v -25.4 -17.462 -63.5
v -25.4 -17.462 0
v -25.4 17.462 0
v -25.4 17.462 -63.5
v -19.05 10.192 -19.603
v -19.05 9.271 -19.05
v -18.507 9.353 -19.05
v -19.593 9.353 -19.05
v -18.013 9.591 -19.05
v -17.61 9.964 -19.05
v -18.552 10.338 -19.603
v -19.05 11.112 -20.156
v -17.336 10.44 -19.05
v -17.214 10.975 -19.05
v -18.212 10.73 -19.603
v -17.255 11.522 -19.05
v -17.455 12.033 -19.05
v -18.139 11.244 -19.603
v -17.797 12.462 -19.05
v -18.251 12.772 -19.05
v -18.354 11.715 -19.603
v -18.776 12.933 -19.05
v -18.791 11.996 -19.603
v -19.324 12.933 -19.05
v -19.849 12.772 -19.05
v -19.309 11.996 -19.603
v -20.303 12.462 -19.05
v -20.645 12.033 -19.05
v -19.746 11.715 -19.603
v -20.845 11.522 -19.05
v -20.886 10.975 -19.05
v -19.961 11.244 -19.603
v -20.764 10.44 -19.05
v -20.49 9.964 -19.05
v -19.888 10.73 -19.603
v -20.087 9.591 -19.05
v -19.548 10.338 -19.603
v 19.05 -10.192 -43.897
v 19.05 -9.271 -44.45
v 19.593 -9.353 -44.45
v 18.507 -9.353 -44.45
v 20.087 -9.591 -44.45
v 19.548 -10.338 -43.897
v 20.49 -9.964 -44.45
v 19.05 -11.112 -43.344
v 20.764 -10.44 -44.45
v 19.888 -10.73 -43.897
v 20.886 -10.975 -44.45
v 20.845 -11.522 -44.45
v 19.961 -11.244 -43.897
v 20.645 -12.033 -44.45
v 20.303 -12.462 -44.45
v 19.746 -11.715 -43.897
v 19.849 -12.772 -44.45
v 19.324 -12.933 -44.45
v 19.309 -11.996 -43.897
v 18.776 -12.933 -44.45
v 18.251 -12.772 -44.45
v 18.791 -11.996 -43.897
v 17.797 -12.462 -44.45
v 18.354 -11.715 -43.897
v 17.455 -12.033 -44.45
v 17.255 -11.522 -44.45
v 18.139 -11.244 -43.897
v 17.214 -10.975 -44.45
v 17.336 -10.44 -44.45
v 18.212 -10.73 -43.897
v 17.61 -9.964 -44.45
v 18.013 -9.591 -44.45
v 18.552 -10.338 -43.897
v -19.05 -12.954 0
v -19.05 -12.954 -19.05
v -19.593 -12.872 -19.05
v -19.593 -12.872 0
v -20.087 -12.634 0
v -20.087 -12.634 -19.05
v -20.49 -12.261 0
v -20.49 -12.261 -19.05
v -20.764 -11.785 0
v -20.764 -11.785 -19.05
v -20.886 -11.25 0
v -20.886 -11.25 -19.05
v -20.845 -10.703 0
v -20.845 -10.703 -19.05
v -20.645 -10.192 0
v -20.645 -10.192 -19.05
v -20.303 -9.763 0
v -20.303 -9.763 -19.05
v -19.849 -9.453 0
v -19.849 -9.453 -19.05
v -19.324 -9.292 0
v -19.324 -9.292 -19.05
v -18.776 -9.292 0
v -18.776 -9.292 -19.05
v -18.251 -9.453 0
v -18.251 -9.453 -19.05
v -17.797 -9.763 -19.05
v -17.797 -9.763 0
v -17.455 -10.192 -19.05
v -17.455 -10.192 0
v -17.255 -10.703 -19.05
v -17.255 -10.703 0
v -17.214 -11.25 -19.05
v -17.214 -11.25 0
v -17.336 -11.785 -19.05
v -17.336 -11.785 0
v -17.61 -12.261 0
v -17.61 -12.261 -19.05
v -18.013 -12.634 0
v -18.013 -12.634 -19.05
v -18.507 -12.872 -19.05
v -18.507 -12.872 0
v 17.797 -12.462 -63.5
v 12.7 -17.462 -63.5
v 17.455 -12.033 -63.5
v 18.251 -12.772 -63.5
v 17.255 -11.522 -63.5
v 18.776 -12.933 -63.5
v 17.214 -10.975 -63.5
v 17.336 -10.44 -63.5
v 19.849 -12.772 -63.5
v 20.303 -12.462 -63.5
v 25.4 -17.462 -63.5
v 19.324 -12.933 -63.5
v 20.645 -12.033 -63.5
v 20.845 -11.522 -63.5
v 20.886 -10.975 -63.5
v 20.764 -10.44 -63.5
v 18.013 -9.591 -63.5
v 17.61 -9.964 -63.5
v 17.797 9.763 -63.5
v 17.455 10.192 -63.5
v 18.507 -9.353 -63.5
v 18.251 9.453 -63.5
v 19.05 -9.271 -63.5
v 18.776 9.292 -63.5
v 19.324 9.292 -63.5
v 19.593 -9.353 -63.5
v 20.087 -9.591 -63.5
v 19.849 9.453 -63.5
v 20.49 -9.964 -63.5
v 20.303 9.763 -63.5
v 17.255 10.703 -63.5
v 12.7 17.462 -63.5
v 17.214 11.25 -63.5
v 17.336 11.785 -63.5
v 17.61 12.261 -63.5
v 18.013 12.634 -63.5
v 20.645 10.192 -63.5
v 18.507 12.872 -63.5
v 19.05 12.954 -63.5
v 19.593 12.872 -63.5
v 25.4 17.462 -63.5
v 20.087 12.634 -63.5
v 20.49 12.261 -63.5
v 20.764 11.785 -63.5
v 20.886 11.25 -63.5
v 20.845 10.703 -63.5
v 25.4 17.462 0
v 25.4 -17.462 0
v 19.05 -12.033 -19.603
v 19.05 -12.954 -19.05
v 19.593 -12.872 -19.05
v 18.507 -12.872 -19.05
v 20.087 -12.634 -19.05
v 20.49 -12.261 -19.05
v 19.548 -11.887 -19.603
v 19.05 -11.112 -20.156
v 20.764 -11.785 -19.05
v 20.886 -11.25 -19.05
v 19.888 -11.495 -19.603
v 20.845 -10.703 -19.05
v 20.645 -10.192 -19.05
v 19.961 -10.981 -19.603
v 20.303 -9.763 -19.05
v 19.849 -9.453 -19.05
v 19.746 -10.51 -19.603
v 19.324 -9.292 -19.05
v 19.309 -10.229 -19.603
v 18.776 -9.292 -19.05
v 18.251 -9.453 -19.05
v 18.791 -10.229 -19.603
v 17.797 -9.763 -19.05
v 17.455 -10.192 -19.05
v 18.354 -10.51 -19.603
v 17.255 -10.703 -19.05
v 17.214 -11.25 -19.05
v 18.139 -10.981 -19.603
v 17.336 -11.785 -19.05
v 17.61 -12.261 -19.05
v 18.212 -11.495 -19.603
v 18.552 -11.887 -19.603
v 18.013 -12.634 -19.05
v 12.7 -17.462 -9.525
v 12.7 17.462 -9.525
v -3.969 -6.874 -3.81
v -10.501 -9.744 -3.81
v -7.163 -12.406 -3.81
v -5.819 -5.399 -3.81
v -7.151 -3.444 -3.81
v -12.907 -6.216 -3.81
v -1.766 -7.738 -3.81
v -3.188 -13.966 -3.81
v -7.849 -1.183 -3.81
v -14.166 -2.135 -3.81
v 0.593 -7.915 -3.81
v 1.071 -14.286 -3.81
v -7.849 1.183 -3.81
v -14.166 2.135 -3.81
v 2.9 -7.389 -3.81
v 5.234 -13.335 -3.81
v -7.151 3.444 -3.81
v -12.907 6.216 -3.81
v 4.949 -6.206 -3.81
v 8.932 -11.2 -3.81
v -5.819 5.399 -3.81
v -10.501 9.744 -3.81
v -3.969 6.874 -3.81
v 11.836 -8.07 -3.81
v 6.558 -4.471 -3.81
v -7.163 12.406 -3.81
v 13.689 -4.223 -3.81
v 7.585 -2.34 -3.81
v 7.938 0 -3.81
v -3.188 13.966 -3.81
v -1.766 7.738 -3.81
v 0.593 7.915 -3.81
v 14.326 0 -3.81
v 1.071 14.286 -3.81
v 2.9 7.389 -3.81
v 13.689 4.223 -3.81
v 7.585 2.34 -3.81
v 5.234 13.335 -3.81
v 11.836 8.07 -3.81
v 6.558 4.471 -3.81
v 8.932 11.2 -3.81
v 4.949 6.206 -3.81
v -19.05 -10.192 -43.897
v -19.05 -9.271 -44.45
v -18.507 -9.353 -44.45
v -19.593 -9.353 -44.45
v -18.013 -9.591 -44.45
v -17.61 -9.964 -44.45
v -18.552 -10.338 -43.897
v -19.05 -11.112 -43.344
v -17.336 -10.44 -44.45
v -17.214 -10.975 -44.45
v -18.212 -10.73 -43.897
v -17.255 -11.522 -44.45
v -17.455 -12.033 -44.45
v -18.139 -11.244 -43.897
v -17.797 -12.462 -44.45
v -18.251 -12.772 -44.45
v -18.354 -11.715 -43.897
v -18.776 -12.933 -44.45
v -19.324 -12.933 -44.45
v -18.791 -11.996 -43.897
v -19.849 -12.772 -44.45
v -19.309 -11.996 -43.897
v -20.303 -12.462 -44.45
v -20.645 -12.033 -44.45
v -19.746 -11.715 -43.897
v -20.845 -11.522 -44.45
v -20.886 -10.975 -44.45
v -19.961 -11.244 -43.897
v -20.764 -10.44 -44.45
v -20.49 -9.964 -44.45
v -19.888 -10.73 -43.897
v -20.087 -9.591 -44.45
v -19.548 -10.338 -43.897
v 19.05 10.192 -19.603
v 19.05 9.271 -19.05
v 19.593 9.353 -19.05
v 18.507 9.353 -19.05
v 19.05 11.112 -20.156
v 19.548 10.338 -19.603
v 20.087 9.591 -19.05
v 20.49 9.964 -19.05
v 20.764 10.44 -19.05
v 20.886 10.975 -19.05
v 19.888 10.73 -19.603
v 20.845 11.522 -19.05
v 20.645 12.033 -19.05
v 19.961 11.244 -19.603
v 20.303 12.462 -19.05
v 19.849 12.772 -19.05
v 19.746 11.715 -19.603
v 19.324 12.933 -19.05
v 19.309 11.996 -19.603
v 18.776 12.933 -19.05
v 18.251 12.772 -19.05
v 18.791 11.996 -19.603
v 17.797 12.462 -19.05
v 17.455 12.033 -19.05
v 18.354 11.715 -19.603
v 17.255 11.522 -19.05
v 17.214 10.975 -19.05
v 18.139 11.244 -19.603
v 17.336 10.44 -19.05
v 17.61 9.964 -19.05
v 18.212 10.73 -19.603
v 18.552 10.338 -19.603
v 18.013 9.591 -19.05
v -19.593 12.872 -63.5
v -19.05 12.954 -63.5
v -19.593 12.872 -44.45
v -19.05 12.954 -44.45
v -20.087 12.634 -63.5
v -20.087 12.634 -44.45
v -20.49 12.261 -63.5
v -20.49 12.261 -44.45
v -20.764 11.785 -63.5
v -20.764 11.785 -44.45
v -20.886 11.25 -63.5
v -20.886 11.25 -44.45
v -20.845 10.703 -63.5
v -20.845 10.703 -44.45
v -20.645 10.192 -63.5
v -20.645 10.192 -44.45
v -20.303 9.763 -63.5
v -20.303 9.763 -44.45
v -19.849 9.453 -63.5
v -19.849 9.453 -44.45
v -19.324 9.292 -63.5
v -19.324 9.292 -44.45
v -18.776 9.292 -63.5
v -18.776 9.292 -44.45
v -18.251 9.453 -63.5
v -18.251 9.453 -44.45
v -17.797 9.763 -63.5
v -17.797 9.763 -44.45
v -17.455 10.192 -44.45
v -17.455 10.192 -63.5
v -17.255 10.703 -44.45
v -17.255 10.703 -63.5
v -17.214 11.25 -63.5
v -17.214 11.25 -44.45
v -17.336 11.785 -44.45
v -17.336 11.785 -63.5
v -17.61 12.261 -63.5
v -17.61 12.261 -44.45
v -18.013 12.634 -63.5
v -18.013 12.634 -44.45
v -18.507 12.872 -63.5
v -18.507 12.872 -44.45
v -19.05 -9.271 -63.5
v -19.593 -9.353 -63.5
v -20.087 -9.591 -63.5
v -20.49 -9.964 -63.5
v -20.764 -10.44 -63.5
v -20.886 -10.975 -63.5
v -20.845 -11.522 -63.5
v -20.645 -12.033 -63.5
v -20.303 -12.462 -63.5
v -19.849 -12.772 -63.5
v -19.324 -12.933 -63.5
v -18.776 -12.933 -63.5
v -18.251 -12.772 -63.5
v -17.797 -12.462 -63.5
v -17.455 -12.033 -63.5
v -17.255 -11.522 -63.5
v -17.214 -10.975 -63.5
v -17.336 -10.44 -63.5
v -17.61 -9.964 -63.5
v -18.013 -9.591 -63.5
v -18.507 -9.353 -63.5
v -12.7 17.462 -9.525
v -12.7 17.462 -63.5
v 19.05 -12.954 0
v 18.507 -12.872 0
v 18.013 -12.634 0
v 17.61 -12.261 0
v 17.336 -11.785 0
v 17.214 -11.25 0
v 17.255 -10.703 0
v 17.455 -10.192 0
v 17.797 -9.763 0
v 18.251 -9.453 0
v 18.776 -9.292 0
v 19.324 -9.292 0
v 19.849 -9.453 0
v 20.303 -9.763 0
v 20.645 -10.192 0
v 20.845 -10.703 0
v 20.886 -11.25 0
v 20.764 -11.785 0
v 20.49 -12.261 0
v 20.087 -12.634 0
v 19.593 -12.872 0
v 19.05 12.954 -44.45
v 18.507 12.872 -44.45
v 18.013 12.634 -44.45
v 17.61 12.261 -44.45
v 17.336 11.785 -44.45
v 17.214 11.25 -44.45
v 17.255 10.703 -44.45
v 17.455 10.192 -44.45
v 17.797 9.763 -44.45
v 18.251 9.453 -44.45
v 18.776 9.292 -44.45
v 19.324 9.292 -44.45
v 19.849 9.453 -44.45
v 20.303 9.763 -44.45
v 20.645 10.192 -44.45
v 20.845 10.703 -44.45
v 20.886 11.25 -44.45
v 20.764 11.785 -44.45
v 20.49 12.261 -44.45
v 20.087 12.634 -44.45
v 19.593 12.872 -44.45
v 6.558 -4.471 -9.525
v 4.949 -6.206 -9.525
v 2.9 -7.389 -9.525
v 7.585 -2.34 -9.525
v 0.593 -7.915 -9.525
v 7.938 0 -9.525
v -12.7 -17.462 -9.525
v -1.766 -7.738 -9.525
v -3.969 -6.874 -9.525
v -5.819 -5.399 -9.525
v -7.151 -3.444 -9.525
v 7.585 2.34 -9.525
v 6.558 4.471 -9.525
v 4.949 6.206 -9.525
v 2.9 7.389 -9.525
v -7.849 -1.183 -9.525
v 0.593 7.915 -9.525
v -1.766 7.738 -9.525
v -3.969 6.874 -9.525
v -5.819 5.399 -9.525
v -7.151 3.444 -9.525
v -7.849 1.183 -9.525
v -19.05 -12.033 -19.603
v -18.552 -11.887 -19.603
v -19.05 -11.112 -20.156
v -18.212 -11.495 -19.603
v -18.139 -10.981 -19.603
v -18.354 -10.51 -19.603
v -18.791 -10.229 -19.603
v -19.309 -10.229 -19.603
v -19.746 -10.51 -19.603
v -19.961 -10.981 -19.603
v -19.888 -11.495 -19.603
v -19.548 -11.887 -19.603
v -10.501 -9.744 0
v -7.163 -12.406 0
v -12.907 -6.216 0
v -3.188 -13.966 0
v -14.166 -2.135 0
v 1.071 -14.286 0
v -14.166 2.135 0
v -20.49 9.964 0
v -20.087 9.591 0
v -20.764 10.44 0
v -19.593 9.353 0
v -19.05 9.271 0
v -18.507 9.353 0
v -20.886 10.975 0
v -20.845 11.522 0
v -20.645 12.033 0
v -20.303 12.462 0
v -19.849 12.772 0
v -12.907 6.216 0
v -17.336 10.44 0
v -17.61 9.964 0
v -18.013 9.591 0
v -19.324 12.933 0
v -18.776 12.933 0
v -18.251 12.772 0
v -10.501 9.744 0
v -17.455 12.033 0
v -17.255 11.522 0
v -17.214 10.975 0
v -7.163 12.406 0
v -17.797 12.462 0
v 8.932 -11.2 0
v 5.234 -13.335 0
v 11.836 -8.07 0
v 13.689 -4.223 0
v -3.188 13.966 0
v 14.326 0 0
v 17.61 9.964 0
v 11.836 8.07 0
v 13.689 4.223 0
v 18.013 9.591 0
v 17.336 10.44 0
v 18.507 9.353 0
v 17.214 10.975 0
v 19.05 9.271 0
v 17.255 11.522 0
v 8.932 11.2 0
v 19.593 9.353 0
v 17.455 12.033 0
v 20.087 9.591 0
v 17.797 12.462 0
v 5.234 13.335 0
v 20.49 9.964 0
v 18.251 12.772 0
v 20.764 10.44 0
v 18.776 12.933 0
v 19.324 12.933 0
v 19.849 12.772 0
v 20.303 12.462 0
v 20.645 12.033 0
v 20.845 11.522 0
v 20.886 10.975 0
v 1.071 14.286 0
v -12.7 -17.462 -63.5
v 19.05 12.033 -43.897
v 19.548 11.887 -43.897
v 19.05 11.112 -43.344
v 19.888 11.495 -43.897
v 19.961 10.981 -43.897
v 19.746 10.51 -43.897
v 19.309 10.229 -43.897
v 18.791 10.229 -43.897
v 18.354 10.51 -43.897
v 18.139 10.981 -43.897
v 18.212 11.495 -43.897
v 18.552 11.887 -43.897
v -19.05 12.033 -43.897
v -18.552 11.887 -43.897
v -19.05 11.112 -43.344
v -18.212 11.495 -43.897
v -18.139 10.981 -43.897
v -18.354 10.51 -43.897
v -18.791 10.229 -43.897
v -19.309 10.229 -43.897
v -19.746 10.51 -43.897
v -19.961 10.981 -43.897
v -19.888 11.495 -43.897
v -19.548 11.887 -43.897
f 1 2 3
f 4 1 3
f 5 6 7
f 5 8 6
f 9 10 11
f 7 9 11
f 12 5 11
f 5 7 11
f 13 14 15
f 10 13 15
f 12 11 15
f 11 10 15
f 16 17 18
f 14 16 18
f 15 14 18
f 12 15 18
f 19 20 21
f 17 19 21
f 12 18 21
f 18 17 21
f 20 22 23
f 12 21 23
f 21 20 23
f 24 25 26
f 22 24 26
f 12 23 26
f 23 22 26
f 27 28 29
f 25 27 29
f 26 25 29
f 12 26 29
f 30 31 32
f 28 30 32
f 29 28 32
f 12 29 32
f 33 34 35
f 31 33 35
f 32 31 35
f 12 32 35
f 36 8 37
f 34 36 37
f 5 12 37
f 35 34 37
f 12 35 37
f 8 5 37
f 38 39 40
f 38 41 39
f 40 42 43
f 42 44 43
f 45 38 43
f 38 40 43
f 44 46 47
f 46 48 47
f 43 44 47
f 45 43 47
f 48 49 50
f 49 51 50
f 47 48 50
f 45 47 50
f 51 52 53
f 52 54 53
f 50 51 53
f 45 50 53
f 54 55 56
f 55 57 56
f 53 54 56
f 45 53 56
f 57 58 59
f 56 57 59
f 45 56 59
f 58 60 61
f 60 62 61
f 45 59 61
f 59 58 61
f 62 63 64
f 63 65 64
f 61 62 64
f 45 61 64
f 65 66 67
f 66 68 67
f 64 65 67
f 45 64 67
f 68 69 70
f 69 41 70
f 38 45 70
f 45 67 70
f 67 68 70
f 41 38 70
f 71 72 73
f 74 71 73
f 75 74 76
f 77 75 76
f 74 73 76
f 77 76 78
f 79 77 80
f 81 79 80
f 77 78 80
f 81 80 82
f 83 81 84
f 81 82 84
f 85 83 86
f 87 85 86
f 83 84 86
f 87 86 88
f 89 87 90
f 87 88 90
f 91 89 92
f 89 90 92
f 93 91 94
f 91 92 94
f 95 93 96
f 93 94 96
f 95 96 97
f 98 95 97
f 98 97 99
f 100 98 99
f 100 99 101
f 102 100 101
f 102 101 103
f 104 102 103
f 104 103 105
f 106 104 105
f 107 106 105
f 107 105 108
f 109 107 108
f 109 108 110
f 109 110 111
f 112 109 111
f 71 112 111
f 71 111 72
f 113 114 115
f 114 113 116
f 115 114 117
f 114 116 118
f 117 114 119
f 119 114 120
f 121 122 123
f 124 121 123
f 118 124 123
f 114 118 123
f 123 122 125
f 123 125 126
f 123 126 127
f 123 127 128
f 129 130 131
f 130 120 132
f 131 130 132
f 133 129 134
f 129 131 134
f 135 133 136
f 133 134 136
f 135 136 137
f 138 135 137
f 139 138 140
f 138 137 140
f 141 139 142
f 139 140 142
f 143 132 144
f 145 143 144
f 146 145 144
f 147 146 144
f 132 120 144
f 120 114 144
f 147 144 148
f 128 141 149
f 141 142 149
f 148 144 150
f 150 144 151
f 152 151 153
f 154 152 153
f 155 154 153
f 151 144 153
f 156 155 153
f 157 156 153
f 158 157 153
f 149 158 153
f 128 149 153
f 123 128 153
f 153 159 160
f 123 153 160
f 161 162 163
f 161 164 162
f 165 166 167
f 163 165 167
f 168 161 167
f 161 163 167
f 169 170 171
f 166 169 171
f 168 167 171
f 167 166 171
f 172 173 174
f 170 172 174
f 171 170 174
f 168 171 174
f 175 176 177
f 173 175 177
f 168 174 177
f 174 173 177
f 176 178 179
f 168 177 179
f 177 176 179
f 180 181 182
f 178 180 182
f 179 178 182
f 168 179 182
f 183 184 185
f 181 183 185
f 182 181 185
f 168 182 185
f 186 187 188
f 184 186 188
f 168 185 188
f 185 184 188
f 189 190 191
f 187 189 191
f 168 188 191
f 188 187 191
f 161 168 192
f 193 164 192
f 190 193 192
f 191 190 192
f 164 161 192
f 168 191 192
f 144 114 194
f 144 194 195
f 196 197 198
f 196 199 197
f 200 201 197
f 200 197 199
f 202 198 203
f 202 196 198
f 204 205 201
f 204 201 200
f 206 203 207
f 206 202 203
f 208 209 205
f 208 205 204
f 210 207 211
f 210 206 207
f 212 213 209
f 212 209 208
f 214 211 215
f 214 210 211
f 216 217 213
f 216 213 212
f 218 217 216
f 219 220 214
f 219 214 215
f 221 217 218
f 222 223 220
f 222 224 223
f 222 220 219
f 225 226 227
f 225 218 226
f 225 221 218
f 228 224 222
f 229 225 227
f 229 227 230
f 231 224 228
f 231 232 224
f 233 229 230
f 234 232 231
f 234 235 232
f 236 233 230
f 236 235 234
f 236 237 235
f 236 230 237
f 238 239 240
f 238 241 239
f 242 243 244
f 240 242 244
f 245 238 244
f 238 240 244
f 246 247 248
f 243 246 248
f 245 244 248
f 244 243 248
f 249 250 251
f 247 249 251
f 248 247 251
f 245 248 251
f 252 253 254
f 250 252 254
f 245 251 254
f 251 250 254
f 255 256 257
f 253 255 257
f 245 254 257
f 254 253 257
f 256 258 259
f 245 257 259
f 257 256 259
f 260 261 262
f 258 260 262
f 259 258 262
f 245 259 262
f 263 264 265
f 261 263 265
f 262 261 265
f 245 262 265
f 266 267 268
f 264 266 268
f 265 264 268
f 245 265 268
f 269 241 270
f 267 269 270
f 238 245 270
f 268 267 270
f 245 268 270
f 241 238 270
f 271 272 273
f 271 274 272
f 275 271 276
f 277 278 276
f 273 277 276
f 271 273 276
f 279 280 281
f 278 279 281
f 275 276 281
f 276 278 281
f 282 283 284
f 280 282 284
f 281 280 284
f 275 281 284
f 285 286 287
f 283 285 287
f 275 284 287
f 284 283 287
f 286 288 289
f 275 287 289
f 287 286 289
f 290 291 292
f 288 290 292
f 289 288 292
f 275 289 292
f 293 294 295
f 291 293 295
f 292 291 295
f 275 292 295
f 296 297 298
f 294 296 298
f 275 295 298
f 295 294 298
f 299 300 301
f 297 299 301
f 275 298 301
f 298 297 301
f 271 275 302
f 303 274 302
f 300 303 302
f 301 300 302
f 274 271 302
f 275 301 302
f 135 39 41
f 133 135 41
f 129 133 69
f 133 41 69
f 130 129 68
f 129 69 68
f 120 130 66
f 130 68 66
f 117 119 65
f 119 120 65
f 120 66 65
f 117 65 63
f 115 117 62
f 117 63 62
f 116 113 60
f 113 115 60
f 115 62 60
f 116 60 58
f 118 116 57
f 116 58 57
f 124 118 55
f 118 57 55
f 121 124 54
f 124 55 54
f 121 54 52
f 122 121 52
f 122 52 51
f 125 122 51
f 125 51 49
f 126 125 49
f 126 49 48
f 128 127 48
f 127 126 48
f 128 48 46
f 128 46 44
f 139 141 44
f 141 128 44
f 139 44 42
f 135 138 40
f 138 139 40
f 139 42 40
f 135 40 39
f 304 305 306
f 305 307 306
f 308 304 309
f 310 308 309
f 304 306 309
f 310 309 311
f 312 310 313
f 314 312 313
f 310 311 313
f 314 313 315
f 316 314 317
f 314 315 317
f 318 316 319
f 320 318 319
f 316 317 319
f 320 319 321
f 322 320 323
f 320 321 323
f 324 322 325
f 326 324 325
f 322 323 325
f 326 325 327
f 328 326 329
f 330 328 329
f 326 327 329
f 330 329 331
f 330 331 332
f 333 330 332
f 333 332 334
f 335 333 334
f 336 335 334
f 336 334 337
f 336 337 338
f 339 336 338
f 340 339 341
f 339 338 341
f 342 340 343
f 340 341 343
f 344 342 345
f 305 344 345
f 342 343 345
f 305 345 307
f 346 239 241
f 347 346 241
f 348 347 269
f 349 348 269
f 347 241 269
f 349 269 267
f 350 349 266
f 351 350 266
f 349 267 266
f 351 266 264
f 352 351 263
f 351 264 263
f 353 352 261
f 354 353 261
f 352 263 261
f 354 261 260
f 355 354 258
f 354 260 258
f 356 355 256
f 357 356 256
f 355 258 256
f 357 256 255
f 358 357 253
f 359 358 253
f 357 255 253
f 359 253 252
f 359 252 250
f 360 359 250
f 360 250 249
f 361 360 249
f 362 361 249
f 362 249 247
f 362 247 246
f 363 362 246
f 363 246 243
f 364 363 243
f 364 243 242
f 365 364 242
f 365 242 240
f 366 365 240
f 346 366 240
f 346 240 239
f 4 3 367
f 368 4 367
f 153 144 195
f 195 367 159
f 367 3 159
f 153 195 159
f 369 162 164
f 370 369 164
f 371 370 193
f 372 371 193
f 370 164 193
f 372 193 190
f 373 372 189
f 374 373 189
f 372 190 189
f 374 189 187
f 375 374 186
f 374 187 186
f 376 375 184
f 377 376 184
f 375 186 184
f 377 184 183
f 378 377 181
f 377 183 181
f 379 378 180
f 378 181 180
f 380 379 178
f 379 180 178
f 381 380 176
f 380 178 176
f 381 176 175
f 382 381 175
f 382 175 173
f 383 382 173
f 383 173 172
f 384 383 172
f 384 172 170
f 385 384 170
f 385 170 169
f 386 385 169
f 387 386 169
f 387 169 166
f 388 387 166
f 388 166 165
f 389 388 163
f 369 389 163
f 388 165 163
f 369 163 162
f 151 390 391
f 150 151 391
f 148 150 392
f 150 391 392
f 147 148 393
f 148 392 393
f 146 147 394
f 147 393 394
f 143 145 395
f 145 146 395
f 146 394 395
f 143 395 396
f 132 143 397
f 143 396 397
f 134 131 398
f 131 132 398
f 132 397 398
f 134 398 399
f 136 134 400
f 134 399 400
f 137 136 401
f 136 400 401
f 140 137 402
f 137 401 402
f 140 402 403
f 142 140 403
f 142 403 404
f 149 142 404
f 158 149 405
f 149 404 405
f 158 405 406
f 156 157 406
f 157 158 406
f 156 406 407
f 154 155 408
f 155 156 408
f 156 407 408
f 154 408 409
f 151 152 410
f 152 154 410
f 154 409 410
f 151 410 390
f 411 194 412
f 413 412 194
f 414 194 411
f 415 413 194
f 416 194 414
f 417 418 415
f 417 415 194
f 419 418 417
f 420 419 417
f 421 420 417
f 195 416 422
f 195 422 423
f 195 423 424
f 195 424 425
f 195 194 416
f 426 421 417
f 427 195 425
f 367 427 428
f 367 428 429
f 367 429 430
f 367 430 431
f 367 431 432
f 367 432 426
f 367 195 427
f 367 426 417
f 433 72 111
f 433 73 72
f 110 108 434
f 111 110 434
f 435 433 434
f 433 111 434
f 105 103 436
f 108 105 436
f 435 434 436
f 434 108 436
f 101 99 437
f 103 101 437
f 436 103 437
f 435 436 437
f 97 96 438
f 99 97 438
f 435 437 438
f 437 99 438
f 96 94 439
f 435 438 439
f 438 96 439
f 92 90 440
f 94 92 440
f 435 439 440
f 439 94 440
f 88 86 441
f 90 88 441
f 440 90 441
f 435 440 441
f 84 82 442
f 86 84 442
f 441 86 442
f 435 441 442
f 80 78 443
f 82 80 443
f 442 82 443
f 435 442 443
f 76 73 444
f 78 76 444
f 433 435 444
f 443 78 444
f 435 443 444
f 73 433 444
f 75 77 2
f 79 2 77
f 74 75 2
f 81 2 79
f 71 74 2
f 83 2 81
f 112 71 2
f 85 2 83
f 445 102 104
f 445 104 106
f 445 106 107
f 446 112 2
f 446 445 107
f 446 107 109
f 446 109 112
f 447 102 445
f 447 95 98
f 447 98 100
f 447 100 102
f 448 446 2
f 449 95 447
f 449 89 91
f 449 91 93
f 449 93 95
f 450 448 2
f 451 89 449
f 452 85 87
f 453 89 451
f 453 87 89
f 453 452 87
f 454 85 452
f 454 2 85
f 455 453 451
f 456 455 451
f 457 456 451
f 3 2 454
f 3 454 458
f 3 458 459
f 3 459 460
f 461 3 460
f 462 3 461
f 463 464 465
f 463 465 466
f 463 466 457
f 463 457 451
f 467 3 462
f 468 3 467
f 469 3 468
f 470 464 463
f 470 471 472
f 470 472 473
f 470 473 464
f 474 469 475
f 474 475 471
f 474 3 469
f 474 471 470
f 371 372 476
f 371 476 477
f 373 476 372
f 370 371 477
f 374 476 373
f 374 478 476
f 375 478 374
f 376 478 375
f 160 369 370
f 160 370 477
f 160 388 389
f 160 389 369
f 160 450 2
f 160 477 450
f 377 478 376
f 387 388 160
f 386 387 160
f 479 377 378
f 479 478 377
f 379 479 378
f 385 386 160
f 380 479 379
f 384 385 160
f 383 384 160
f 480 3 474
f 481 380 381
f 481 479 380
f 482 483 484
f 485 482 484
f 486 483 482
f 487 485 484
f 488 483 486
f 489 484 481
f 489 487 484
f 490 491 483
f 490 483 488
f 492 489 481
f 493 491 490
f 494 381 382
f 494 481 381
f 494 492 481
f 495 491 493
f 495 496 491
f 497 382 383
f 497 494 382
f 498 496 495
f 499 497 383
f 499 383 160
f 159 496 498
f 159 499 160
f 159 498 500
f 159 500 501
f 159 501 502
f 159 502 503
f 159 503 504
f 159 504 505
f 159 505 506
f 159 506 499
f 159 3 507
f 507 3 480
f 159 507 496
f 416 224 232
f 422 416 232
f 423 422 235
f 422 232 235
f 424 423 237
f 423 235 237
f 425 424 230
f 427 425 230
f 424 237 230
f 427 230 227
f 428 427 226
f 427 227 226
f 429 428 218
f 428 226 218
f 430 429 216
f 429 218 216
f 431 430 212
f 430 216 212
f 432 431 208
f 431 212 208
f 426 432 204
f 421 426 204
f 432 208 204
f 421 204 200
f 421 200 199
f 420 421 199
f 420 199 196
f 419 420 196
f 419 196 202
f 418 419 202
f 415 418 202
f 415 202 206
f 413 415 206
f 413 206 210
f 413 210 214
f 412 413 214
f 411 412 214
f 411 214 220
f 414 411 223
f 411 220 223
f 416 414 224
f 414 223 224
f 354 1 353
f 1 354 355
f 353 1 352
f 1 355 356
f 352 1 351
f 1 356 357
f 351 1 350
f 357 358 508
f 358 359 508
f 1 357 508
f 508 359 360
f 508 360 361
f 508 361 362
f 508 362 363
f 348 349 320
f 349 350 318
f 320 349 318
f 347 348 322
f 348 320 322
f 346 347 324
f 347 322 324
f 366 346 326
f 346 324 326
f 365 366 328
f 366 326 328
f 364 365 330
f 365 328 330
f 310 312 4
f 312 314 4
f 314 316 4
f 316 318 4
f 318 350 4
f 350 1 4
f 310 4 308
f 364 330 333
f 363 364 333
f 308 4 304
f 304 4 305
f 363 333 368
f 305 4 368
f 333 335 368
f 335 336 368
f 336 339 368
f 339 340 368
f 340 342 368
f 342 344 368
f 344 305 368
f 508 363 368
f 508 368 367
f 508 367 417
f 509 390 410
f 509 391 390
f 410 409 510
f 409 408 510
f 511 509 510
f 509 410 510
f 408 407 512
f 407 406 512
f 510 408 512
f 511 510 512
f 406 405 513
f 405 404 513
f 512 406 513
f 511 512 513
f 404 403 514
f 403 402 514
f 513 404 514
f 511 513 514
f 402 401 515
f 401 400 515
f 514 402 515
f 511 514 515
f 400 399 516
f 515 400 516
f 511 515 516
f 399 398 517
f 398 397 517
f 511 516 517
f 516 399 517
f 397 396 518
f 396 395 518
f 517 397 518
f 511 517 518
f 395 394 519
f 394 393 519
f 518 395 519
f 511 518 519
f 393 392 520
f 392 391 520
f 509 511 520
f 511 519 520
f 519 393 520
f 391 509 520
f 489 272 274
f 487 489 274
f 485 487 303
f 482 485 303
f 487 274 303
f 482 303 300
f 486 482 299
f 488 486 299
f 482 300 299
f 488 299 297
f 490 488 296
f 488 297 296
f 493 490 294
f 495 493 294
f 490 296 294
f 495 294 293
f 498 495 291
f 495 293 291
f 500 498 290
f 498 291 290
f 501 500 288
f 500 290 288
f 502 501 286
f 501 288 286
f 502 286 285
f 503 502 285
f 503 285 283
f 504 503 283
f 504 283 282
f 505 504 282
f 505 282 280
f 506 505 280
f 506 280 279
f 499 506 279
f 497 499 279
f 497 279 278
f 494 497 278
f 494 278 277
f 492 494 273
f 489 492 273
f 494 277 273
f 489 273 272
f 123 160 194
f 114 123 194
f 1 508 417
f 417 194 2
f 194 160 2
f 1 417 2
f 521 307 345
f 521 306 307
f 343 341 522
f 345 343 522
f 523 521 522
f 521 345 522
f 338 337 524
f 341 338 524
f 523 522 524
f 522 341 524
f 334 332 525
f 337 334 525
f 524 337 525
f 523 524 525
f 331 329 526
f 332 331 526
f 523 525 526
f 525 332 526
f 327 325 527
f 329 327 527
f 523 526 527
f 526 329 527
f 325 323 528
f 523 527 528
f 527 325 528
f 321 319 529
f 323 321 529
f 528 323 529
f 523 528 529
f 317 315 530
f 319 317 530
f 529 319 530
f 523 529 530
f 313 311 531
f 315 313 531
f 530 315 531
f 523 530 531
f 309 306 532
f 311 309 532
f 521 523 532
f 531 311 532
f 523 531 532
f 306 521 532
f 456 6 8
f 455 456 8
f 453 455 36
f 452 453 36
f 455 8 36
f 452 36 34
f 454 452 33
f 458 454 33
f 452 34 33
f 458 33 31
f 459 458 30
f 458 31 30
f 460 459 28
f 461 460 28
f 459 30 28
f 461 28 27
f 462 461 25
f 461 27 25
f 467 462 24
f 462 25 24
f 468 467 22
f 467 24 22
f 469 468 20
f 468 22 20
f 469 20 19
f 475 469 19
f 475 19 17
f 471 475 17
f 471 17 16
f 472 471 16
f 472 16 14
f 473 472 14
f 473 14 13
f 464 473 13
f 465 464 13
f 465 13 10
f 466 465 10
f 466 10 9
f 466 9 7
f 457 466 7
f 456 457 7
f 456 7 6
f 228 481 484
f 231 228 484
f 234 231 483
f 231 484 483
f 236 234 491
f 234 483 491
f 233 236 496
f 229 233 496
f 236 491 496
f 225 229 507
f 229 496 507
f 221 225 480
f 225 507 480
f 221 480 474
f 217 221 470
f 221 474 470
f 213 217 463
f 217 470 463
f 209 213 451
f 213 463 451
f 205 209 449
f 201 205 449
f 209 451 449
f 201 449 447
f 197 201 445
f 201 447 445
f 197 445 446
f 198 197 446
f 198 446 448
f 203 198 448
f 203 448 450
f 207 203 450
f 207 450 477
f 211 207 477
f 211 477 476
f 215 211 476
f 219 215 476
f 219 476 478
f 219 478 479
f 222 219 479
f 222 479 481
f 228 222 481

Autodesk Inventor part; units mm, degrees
ref_plane "YZ Plane" through (0, 0, 0) normal (1, 0, 0) x (0, 1, 0)
ref_plane "XZ Plane" through (0, 0, 0) normal (0, 1, 0) x (-1, 0, 0)
ref_plane "XY Plane" through (0, 0, 0) normal (0, 0, 1) x (1, 0, 0)
sketch "Sketch1" plane through (0, 0, 0) normal (0, 0, 1) x (1, 0, 0)
  line L0 (-35.56, 0) -> (35.56, 0) projected
  line L1 (0, -24.4475) -> (0, 24.4475) projected
  circle A0 centre (0, 0) radius 14.2875 construction
  line L2 (-25.4, 17.4625) -> (25.4, 17.4625)
  line L3 (25.4, 17.4625) -> (25.4, -17.4625)
  line L4 (25.4, -17.4625) -> (-25.4, -17.4625)
  line L5 (-25.4, -17.4625) -> (-25.4, 17.4625)
  circle A1 centre (0, 0) radius 7.9375
  point P0 (0, 17.4625)
  point P1 (25.4, 0)
  dimension "d1" = 28.575
  dimension "d2" = 34.925
  dimension "d3" = 50.8
  dimension "d4" = 15.875
extrude "Extrusion1" add sketch "Sketch1" against normal blind 63.5 contours L5 L2 L1 A1 L0 | L0 A1 L1 L4 L5 | L1 L2 L3 L0 A1 | A1 L0 L3 L4 L1
sketch "Sketch2" plane through (0, 0, -63.5) normal (0, 0, -1) x (-1, 0, 0)
  circle A0 centre (0, 0) radius 7.9375 projected
  line L0 (-25.4, 17.4625) -> (25.4, 17.4625) projected
  line L1 (25.4, -17.4625) -> (-25.4, -17.4625) projected
  line L2 (-12.7, 17.4625) -> (12.7, 17.4625)
  line L3 (12.7, 17.4625) -> (12.7, -17.4625)
  line L4 (12.7, -17.4625) -> (-12.7, -17.4625)
  line L5 (-12.7, -17.4625) -> (-12.7, 17.4625)
  point P0 (0, 17.4625)
  point P1 (0, 17.4625)
  dimension "d7" = 25.4
extrude "Extrusion2" cut sketch "Sketch2" against normal blind 53.975
sketch "Sketch3" plane through (0, 0, 0) normal (0, 0, 1) x (1, 0, 0)
  circle A0 centre (0, 0) radius 7.9375 projected
  circle A1 centre (0, 0) radius 14.3256
  dimension "d10" = 28.6512
extrude "Extrusion3" cut sketch "Sketch3" against normal blind 3.81
sketch "Sketch5" plane through (0, 0, 0) normal (0, 0, 1) x (1, 0, 0)
  line L0 (-25.4, 17.4625) -> (25.4, 17.4625) projected
  line L1 (-25.4, -17.4625) -> (-25.4, 17.4625) projected
  line L2 (-35.56, 0) -> (35.56, 0) projected
  line L3 (0, -24.4475) -> (0, 24.4475) projected
  point P0 (-19.05, 11.1125)
  point P1 (19.05, 11.1125)
  point P2 (-19.05, -11.1125)
  point P3 (19.05, -11.1125)
  dimension "d13" = 6.35
  dimension "d14" = 6.35
hole "Hole1" at (-19.05, 11.1125, 0) at (19.05, 11.1125, 0) at (-19.05, -11.1125, 0) at (19.05, -11.1125, 0) direction (0, 0, -1) diameter 3.683 depth 19.05 tip angle 118 thread size "10-24 UNC" class "2B" standard "ANSI Unified Screw Threads"
sketch "Sketch6" plane through (0, 0, -63.5) normal (0, 0, -1) x (-1, 0, 0)
  line L0 (12.7, 17.4625) -> (25.4, 17.4625) projected
  line L1 (35.56, 0) -> (-35.56, 0) projected
  line L2 (0, -24.4475) -> (0, 24.4475) projected
  point P0 (0, 0)
  point P1 (19.05, 11.1125)
  point P2 (19.05, 17.4625)
  point P3 (19.05, -11.1125)
  dimension "d22" = 6.35
hole "Hole2" at (-19.05, 11.1125, -63.5) at (-19.05, -11.1125, -63.5) direction (0, 0, 1) diameter 3.683 depth 19.05 tip angle 118 thread size "10-24 UNC" class "2B" standard "ANSI Unified Screw Threads"
mirror "Mirror1" about plane through (0, 0, 0) normal (1, 0, 0) of "Hole2"
properties part number "mount pillow block inner"
